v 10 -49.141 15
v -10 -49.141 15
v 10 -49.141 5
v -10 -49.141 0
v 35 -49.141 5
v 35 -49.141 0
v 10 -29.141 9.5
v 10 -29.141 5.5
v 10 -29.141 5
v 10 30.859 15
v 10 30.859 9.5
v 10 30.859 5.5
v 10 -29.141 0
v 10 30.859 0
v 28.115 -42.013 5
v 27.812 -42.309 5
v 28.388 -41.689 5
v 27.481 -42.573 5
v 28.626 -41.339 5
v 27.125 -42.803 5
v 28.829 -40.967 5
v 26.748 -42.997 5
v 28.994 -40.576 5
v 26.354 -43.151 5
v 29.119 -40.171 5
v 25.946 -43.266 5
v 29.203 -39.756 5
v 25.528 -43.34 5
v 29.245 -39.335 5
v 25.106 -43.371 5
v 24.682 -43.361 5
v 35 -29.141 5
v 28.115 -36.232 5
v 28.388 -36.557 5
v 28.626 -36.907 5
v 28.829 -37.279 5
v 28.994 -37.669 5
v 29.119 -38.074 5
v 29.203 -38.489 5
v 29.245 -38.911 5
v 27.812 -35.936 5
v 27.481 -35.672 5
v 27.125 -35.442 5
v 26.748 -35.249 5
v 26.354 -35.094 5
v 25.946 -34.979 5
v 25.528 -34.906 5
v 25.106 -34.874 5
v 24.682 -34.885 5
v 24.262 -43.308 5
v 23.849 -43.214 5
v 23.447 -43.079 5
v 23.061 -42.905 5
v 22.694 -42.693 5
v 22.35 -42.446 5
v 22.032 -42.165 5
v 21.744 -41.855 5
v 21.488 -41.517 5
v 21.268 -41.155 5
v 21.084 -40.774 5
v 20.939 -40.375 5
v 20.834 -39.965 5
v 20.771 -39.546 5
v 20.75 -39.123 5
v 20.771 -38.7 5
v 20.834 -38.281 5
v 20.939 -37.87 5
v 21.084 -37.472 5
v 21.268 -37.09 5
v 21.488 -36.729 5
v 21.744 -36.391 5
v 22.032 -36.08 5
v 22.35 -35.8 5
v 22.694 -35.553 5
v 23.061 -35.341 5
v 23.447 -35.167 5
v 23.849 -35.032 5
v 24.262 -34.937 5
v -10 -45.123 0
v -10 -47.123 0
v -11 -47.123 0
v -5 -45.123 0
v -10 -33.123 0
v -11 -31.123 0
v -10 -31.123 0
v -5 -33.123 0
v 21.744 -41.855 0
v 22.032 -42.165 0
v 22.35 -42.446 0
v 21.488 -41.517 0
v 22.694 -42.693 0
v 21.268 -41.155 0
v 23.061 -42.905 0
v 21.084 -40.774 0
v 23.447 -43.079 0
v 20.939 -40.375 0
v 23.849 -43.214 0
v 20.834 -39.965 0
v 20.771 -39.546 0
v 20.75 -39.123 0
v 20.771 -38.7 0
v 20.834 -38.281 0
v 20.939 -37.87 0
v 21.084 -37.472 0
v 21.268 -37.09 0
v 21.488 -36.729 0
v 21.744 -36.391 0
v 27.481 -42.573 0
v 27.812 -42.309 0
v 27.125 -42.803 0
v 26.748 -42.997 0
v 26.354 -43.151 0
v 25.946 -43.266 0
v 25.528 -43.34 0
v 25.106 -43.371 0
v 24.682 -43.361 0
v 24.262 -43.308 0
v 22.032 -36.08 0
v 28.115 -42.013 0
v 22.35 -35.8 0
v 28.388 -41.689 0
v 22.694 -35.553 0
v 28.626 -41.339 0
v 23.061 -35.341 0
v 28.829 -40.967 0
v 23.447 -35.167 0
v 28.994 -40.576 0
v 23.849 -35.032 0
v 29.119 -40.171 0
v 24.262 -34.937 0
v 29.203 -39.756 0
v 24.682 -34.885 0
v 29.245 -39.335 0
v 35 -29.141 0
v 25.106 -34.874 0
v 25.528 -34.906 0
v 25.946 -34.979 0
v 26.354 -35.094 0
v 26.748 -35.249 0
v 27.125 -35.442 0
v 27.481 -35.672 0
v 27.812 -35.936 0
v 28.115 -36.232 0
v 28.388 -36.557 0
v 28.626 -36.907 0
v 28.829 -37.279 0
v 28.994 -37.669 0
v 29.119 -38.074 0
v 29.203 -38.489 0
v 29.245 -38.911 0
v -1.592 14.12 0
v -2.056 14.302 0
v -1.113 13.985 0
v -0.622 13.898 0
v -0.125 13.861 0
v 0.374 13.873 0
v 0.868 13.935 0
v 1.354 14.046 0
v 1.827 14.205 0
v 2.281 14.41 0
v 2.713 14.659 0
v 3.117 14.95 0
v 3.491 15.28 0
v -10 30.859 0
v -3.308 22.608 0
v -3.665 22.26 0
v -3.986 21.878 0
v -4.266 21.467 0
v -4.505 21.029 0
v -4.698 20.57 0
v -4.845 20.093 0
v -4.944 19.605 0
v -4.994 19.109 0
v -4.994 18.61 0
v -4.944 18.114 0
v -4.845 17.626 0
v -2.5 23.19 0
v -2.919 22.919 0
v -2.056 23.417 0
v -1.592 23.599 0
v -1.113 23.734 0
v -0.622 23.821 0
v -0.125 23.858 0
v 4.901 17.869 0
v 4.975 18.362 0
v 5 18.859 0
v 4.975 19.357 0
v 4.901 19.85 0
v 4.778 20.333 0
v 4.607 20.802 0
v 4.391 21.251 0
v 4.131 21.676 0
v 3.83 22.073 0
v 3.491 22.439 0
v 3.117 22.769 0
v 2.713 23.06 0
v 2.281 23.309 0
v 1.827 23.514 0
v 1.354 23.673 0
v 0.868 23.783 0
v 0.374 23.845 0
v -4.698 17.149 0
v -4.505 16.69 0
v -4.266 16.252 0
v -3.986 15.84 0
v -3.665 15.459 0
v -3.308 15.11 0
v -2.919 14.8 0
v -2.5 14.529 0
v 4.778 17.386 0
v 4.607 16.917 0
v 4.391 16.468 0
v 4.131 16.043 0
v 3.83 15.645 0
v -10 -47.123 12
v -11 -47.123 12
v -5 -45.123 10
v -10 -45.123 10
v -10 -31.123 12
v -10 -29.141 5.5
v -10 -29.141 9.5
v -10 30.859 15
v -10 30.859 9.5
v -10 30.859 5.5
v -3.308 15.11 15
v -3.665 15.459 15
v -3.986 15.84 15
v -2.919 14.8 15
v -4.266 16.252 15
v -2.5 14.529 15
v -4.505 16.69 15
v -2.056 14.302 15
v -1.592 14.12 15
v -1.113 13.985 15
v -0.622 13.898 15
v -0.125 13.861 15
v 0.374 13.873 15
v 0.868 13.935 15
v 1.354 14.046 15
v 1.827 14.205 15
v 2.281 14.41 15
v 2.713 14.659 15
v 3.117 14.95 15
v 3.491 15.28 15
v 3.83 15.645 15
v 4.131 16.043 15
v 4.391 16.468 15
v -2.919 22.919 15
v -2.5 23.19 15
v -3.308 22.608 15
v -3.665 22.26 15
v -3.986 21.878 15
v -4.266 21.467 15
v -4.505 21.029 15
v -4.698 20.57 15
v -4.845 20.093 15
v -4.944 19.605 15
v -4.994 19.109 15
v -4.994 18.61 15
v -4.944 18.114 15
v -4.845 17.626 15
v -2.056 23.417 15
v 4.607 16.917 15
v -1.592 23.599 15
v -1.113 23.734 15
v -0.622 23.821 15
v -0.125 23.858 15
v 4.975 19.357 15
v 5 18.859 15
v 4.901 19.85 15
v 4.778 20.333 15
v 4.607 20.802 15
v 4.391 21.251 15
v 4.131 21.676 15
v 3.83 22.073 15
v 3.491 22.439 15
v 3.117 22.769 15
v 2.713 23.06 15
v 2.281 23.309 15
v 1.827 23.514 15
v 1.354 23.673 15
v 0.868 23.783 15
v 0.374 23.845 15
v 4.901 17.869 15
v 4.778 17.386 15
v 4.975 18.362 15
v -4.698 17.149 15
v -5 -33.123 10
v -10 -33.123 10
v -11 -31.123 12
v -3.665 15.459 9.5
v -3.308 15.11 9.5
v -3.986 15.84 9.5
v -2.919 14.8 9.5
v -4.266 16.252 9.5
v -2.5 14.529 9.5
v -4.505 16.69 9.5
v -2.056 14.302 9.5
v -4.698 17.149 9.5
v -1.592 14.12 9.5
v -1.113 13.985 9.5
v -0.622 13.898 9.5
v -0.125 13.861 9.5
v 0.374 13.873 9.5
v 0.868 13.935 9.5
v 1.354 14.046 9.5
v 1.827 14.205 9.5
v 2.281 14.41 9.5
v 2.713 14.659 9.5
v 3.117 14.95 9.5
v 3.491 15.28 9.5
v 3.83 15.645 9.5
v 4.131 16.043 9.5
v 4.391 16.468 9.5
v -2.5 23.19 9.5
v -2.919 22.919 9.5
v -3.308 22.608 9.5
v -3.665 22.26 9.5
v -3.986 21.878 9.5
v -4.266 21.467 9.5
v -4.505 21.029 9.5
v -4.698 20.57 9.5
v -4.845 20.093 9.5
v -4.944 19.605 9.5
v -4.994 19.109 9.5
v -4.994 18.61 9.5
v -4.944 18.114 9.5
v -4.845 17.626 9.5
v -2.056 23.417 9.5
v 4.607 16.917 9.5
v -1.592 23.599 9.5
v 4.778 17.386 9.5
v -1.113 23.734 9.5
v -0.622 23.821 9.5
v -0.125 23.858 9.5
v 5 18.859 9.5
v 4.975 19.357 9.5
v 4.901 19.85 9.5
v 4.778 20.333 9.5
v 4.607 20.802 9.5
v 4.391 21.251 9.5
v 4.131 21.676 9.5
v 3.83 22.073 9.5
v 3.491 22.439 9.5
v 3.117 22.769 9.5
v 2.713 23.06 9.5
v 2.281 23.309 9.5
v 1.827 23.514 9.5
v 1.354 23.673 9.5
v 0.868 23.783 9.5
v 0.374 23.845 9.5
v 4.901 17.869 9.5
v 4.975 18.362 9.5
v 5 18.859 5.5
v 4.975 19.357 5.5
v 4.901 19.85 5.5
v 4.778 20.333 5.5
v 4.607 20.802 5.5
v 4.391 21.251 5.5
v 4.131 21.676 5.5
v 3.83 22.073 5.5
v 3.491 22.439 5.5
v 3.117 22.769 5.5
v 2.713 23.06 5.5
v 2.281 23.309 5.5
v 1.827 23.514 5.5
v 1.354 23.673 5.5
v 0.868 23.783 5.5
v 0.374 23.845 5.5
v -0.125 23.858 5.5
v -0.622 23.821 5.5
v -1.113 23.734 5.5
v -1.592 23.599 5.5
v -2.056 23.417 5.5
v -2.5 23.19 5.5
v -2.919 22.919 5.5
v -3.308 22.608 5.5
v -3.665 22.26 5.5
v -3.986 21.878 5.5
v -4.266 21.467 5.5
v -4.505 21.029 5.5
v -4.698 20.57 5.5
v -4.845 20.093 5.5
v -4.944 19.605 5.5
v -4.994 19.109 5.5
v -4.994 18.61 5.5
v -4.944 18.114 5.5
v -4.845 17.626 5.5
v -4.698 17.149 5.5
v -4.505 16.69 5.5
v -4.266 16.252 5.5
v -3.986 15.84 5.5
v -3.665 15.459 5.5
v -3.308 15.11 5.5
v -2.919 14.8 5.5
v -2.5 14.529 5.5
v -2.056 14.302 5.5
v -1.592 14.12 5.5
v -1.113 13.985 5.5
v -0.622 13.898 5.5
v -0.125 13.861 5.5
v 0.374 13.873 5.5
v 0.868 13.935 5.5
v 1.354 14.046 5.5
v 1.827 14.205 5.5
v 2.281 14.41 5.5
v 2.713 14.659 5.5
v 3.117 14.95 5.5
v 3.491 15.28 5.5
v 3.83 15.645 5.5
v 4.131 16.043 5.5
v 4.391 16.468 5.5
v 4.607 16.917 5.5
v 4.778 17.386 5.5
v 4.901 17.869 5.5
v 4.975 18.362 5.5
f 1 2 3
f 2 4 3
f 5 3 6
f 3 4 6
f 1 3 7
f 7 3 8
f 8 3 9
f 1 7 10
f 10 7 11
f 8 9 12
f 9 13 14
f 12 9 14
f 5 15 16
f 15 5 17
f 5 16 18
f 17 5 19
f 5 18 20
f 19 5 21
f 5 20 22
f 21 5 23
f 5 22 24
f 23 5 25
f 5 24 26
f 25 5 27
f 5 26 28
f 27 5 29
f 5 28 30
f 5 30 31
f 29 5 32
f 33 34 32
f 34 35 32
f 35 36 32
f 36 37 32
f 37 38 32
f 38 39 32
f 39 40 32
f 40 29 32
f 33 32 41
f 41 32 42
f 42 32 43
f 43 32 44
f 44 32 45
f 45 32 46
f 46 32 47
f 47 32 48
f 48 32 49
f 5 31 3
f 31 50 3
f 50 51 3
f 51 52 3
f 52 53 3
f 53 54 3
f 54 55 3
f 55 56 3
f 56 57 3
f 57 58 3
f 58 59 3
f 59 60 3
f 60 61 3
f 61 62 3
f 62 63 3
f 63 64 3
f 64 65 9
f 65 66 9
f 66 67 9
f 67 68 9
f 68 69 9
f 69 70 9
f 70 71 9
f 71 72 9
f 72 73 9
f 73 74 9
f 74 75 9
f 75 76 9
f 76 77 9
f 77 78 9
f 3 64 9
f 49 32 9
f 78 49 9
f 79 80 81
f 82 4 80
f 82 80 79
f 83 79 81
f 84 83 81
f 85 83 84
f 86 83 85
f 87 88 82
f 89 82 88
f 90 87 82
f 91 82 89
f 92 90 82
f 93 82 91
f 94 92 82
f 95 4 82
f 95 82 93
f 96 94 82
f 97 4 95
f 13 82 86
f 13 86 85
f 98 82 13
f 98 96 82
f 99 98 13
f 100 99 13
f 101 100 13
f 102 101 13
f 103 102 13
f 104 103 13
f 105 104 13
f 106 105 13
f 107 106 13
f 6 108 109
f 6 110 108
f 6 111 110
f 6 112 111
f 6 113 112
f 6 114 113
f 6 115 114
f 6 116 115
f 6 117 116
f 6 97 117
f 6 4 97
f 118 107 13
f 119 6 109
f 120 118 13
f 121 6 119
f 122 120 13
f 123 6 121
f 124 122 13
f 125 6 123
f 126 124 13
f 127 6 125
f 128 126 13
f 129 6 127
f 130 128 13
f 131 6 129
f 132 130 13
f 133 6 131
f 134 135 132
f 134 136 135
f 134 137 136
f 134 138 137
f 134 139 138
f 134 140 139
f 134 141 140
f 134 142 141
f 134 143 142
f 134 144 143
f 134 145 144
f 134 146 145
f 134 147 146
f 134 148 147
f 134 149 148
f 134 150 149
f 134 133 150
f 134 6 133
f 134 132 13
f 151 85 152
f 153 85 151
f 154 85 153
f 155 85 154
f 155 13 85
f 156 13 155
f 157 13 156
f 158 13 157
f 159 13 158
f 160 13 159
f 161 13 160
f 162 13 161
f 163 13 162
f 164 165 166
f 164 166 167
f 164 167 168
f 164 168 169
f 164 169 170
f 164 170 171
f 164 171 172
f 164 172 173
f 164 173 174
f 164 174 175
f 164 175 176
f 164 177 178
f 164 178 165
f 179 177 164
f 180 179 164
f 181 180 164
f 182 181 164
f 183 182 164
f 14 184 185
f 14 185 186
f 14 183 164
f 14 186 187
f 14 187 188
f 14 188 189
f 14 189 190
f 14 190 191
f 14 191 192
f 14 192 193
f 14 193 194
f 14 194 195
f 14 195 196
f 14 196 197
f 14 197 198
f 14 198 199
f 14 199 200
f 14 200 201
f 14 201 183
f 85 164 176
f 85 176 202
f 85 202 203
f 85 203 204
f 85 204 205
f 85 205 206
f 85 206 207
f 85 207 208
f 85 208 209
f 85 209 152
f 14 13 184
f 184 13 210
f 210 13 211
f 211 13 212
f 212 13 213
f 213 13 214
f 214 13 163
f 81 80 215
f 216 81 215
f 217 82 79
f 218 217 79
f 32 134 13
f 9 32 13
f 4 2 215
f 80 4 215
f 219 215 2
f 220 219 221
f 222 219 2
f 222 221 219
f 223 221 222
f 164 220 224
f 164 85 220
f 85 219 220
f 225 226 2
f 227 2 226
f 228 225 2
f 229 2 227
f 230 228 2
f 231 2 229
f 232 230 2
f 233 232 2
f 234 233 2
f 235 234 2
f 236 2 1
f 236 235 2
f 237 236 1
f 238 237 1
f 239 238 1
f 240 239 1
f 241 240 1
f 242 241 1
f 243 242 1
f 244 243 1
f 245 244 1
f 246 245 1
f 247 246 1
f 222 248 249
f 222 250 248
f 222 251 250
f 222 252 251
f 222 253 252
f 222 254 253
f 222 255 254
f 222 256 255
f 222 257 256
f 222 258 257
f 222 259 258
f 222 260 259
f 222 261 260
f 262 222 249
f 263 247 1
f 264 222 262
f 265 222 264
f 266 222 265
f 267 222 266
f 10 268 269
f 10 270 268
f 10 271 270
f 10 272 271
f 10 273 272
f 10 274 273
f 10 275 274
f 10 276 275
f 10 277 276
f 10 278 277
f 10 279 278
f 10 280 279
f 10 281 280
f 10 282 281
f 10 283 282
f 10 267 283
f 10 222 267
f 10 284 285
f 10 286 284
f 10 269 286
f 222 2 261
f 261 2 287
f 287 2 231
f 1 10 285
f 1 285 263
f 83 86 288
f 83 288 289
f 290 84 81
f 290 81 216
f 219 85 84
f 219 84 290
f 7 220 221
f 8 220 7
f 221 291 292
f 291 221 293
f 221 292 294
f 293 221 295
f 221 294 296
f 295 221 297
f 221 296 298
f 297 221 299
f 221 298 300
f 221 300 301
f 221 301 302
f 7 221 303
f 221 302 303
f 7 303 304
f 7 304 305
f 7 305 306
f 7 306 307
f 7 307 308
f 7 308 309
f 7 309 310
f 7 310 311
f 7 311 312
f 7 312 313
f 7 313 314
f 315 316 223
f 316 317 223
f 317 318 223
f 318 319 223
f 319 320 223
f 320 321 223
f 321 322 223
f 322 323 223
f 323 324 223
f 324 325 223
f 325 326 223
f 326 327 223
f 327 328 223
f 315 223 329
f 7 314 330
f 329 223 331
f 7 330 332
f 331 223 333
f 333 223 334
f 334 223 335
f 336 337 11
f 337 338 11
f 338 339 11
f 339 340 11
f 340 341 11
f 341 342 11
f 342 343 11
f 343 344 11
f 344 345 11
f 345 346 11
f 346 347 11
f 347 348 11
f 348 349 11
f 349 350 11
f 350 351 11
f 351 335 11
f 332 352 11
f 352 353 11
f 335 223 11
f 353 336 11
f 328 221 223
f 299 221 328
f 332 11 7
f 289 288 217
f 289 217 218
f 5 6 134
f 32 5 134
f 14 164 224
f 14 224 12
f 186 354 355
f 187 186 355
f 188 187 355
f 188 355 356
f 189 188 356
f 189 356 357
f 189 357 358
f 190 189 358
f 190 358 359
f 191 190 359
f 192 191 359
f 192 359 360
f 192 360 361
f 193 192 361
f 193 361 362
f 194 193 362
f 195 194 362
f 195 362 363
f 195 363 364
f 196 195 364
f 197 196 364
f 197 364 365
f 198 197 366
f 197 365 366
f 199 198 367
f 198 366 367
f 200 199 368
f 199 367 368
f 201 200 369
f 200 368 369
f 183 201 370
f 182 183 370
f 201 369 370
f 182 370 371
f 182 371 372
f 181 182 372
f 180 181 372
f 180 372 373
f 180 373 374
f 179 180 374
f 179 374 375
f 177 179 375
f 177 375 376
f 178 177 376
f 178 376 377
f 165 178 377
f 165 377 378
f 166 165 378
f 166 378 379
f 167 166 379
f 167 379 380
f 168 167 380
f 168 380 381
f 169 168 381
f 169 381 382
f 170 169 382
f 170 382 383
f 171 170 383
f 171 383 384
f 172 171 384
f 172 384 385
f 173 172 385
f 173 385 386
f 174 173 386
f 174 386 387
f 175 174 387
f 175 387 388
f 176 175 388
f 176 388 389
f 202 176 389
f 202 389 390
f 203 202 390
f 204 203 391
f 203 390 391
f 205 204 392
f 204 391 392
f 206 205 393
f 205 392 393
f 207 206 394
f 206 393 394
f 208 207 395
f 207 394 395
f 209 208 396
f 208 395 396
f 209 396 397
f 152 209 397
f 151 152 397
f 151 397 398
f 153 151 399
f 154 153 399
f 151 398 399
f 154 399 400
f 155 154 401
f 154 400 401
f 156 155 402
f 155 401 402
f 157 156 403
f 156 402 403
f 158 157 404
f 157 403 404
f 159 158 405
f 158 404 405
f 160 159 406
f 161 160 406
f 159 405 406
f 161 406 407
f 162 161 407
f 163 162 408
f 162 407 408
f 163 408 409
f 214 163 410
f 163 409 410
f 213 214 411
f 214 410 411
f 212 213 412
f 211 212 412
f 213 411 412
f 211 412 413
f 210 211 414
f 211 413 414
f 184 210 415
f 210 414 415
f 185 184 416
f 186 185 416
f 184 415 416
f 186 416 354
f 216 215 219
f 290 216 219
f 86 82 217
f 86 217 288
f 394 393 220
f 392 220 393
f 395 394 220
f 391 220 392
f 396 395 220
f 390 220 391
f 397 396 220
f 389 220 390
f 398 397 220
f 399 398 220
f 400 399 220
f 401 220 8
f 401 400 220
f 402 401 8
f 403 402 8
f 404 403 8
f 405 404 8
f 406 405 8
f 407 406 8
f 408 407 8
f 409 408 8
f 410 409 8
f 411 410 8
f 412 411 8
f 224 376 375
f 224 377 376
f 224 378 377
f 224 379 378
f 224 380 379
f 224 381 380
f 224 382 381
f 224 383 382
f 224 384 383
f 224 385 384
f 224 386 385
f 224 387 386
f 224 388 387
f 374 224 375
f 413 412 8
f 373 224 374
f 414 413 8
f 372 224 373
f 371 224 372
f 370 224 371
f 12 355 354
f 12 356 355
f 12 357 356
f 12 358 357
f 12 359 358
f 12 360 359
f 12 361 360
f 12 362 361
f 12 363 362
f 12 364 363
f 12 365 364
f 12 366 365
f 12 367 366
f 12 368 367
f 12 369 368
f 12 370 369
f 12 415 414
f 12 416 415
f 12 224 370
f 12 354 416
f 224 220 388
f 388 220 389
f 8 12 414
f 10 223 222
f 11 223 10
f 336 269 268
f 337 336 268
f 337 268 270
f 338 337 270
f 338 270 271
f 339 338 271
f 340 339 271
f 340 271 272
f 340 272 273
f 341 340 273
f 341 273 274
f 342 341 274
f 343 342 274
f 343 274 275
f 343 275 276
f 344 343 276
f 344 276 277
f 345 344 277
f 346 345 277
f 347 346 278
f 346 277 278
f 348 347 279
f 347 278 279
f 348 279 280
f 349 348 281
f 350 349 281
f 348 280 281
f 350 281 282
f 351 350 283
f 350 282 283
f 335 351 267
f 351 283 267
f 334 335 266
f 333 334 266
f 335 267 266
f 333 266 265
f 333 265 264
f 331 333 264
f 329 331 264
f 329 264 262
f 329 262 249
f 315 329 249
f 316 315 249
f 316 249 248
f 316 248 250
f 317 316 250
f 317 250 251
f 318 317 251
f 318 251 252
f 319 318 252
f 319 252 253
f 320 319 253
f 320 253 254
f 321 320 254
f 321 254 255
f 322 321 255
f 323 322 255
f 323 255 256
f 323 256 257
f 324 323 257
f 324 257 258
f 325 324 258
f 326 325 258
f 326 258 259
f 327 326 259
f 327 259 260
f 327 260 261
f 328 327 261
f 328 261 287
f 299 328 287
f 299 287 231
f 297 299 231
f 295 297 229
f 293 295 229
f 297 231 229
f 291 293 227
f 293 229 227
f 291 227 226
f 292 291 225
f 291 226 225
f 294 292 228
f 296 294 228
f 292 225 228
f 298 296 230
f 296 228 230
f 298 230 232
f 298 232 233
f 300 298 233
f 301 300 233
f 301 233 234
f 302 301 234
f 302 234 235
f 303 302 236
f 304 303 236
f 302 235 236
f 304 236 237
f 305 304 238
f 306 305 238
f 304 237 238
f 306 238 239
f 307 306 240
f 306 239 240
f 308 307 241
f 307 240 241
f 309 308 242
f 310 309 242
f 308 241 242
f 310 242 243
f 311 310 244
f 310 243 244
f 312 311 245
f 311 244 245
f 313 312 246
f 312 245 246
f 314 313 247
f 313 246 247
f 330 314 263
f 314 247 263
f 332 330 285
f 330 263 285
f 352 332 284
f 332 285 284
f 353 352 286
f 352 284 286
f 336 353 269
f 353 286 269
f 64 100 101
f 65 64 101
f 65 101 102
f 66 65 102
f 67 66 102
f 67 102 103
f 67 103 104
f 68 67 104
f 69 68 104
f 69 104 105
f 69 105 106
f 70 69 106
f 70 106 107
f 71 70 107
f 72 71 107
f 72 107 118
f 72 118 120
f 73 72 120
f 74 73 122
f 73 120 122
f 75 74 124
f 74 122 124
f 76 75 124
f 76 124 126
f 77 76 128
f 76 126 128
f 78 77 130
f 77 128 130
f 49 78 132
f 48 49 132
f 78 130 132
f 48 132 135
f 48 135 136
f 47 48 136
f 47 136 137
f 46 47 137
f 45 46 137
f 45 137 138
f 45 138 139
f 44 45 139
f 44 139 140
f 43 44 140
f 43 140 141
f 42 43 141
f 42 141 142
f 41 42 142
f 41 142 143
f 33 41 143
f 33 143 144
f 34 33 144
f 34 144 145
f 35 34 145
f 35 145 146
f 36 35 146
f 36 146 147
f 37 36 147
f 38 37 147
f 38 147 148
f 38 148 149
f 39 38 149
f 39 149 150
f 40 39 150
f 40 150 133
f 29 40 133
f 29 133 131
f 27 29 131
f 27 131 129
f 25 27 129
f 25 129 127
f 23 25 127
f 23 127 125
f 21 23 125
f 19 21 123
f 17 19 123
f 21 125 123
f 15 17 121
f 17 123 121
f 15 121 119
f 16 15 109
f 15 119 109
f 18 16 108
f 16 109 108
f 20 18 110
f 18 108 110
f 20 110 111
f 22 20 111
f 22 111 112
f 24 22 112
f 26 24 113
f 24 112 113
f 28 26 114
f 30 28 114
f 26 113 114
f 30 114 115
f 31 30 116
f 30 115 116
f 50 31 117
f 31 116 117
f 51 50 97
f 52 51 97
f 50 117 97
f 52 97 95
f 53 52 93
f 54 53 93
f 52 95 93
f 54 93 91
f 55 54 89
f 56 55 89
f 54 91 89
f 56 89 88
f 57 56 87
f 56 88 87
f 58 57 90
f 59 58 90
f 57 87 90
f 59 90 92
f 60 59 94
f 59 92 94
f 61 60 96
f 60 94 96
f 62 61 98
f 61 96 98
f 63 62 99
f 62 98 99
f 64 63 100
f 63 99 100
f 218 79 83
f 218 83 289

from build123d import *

# Parameters (mm, degrees)
SKETCH1_W           = 20
SKETCH1_H           = 70
BOSS_EXTRUDE1_DEPTH = 15
SKETCH2_W           = 20
SKETCH2_H           = 4
CUT_EXTRUDE1_DEPTH  = 60
SKETCH3_R           = 5
CUT_EXTRUDE2_DEPTH  = 15
SKETCH4_W           = 45
SKETCH4_H           = 20
BOSS_EXTRUDE2_DEPTH = 5
SKETCH7_R           = 4.25
CUT_EXTRUDE4_DEPTH  = 8
SKETCH8_W           = 20
SKETCH8_H           = 10
BOSS_EXTRUDE3_DEPTH = 10
SKETCH9_W           = 5
SKETCH9_H           = 12
CUT_EXTRUDE5_DEPTH  = 10
SKETCH10_W          = 12
SKETCH10_H          = 16
BOSS_EXTRUDE4_DEPTH = 1


with BuildPart() as part:
    # Sketch1 → Boss-Extrude1 (new body)
    with BuildSketch(Plane.XY):
        with Locations((0, -4.140597693)):
            Rectangle(SKETCH1_W, SKETCH1_H)
    extrude(amount=BOSS_EXTRUDE1_DEPTH)

    # Sketch2 → Cut-Extrude1 (cut)
    with BuildSketch(Plane(origin=(0, 30.859402307, 0), x_dir=(1, 0, 0), z_dir=(0, 1, 0))):
        with Locations((0, -7.5)):
            Rectangle(SKETCH2_W, SKETCH2_H)
    extrude(amount=-CUT_EXTRUDE1_DEPTH, mode=Mode.SUBTRACT)

    # Sketch3 → Cut-Extrude2 (cut)
    with BuildSketch(Plane.XY.offset(15)):
        with Locations((0, 18.859402307)):
            Circle(SKETCH3_R)
    extrude(amount=-CUT_EXTRUDE2_DEPTH, mode=Mode.SUBTRACT)

    # Sketch4 → Boss-Extrude2 (add)
    with BuildSketch(Plane(origin=(0, 0, 0), x_dir=(-1, 0, 0), z_dir=(0, 0, -1))):
        with Locations((-12.5, -39.140597693)):
            Rectangle(SKETCH4_W, SKETCH4_H)
    extrude(amount=-BOSS_EXTRUDE2_DEPTH)

    # Sketch7 → Cut-Extrude4 (cut)
    with BuildSketch(Plane(origin=(0, 0, 0), x_dir=(-1, 0, 0), z_dir=(0, 0, -1))):
        with Locations((-25, -39.122753145)):
            Circle(SKETCH7_R)
    extrude(amount=-CUT_EXTRUDE4_DEPTH, mode=Mode.SUBTRACT)

    # Sketch8 → Boss-Extrude3 (add)
    with BuildSketch(Plane.XY.offset(5)):
        with Locations((0, -44.140597693)):
            Rectangle(SKETCH8_W, SKETCH8_H)
    extrude(amount=BOSS_EXTRUDE3_DEPTH)

    # Sketch9 → Cut-Extrude5 (cut)
    with BuildSketch(Plane(origin=(0, 0, 0), x_dir=(-1, 0, 0), z_dir=(0, 0, -1))):
        with Locations((7.5, -39.122753145)):
            Rectangle(SKETCH9_W, SKETCH9_H)
    extrude(amount=-CUT_EXTRUDE5_DEPTH, mode=Mode.SUBTRACT)

    # Sketch10 → Boss-Extrude4 (add)
    with BuildSketch(Plane.ZY.offset(10)):
        with Locations((6, -39.122753145)):
            Rectangle(SKETCH10_W, SKETCH10_H)
    extrude(amount=BOSS_EXTRUDE4_DEPTH)


solid = part.part
